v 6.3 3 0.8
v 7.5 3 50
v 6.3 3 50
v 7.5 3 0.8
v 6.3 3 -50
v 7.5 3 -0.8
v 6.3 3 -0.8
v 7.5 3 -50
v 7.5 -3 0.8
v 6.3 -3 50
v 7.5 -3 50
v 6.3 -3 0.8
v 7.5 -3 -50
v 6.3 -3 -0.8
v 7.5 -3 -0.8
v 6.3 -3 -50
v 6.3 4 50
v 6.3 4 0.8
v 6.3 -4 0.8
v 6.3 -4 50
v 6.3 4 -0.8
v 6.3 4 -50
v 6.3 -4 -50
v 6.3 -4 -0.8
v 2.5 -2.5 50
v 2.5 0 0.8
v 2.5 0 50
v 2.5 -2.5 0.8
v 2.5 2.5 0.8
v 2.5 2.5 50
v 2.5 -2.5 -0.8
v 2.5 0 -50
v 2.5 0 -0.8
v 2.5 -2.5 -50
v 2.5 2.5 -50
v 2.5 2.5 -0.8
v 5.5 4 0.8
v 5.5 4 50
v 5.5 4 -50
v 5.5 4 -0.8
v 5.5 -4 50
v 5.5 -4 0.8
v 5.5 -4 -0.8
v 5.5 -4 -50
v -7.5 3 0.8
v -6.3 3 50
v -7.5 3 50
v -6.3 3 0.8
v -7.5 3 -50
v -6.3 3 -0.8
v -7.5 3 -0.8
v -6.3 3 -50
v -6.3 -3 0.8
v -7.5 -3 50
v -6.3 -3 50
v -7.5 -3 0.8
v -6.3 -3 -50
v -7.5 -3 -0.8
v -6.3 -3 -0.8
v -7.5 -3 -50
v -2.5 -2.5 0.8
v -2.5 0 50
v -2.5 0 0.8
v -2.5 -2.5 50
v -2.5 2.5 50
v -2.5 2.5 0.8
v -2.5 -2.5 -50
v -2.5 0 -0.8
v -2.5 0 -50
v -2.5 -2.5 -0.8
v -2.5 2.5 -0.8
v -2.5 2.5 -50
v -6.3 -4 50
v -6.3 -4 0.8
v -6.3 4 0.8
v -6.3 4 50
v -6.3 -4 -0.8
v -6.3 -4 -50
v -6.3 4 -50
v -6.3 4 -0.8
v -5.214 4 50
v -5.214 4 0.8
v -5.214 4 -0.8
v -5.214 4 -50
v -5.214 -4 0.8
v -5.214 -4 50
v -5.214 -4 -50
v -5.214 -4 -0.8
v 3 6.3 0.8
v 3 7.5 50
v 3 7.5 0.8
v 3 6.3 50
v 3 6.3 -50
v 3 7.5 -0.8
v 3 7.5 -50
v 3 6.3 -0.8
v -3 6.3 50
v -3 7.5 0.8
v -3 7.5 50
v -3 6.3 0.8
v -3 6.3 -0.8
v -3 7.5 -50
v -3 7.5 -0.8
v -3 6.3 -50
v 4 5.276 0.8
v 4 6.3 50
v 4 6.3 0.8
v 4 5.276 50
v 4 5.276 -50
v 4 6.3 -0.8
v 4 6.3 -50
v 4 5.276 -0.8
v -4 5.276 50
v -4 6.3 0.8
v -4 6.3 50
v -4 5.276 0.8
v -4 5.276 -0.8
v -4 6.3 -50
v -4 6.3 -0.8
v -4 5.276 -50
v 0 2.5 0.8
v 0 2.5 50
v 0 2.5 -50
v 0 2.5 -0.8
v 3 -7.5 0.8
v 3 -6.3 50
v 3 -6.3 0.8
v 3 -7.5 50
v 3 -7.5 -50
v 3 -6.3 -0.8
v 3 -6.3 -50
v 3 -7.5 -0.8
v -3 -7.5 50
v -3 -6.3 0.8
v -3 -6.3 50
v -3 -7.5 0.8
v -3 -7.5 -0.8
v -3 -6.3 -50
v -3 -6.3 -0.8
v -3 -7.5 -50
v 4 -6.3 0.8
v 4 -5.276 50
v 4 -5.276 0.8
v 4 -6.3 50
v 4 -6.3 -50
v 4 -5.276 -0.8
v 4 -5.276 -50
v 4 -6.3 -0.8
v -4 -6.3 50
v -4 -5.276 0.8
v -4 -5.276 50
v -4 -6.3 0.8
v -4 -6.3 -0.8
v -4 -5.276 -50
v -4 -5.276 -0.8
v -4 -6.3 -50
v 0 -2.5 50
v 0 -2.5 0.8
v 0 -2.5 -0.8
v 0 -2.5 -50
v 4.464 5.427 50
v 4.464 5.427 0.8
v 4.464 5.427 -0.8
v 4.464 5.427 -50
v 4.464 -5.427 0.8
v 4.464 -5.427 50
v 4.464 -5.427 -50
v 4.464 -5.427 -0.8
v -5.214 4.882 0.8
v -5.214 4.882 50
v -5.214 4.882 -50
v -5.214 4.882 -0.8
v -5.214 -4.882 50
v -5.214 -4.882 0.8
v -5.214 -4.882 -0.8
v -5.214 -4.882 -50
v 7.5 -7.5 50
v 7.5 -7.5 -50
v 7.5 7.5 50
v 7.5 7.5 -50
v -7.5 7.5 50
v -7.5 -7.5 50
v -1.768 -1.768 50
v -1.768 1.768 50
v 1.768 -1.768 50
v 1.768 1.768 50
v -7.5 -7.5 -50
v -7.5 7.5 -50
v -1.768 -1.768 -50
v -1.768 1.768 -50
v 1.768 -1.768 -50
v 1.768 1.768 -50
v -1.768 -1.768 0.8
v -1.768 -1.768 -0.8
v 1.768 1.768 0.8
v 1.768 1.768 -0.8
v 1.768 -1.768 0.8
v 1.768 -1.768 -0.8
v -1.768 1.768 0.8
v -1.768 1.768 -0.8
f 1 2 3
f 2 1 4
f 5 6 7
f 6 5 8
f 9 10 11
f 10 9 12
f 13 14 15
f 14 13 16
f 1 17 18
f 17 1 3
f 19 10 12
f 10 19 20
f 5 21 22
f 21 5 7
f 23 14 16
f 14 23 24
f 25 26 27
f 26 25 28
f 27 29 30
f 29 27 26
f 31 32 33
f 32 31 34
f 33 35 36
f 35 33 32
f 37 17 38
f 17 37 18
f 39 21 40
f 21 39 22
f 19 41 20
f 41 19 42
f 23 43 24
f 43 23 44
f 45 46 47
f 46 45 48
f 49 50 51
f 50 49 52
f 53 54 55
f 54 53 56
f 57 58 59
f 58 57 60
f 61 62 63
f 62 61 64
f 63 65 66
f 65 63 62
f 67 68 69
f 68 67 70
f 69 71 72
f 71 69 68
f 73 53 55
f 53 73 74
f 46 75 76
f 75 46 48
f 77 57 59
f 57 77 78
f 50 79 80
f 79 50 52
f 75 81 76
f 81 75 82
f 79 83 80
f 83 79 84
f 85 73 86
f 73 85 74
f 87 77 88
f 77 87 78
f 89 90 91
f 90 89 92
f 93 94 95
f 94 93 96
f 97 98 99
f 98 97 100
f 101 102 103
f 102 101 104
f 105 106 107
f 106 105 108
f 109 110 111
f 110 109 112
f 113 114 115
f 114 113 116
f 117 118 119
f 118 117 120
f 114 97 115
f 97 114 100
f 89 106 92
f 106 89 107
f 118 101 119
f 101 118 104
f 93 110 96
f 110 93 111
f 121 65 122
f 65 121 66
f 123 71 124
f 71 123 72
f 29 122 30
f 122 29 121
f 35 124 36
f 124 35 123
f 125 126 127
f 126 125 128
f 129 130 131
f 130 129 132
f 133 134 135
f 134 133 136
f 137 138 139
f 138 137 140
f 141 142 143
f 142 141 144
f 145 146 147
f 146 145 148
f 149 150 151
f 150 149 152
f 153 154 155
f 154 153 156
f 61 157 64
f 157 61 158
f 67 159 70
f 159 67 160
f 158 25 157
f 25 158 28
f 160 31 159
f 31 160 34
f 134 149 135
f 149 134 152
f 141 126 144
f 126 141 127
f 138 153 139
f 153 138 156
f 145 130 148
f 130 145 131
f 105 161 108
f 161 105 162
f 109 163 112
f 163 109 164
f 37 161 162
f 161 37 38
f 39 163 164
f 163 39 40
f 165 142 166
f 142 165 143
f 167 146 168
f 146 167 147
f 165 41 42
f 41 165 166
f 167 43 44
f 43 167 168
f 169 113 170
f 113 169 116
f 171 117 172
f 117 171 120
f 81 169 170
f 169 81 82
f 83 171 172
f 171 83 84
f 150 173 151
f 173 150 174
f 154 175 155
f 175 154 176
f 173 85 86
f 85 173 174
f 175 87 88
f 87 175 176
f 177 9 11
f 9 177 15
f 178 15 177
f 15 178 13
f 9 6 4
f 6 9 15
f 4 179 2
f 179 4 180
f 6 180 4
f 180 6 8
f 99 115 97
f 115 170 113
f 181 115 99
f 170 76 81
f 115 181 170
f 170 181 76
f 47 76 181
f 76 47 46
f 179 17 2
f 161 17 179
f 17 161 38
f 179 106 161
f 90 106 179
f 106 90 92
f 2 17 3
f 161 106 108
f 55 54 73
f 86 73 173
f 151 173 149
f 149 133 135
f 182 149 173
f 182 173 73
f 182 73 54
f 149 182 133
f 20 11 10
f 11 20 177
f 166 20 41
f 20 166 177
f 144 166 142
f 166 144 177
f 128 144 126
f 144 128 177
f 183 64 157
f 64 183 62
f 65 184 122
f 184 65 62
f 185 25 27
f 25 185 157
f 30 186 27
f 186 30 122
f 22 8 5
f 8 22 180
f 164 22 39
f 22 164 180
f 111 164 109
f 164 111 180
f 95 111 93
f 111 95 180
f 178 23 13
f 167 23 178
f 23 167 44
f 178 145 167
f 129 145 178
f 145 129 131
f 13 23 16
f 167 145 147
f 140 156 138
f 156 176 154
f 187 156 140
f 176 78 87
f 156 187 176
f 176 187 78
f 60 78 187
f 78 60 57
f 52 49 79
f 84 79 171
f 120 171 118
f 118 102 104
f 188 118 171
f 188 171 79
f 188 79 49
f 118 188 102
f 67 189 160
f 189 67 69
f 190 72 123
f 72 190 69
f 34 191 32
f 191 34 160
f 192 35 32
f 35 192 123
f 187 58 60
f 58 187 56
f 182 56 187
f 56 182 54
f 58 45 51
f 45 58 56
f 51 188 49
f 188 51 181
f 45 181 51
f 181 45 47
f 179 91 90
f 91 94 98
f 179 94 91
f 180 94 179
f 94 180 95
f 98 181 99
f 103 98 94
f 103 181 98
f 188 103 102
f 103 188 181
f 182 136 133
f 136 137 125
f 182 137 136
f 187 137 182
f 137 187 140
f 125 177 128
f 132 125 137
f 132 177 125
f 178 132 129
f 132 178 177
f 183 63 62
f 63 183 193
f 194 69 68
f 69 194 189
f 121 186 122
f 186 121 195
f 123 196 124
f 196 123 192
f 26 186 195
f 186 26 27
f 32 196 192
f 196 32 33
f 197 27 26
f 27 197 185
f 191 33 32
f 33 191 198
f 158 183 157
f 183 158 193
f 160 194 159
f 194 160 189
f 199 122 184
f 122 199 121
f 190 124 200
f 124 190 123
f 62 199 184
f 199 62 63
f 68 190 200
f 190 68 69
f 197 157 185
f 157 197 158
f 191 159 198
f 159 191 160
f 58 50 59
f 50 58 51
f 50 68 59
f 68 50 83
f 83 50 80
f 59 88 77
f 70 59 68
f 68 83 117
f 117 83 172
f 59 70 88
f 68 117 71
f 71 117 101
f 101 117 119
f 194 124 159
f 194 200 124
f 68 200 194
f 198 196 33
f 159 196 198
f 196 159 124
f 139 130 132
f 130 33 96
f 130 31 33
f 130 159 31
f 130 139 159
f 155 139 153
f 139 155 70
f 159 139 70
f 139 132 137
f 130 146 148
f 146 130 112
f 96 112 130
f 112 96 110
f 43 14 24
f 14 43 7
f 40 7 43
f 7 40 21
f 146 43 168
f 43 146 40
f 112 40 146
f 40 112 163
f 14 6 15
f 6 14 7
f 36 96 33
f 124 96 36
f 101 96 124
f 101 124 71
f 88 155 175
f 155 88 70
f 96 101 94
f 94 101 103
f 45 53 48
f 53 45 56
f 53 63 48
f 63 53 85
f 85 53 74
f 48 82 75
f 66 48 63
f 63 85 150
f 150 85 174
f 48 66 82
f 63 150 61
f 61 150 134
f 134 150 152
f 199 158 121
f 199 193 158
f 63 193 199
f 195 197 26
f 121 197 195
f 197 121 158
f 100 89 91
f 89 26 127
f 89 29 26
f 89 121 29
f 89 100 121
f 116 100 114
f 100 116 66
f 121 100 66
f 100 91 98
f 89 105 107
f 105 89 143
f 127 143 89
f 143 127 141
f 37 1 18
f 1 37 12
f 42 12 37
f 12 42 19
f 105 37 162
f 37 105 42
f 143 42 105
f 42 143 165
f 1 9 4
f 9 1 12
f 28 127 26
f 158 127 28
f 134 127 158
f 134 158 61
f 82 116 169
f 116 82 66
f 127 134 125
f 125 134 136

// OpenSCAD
// Parameters
cross_section_width = 15; //[7.5:30:0.5]
cross_section_height = 15; //[7.5:30:0.5]
length = 100; //[50:200:1]
center = 1; //[0:1:1]
cornerHole = 1; //[0:1:1]
wall_thickness = 1.6; //[0.8:3.2:0.1]
slot_opening_width = 6.0; //[3.0:10.0:0.1]
slot_inner_width = 8.0; //[4.0:12.0:0.1]
slot_depth = 4.2; //[2.0:7.0:0.1]
slot_neck_depth = 2.0; //[1.0:4.0:0.1]
center_bore_diameter = 5.0; //[2.0:8.0:0.1]
corner_hole_diameter = 3.0; //[1.5:6.0:0.1]
corner_hole_inset = 3.5; //[2.0:6.0:0.1]
overlap = 0.8; //[0.5:2.0:0.1]

// Extrusion - complete geometry
module extrusion() {
  color("Silver") {
    difference() {
      // Main body
      cube([cross_section_width, cross_section_height, length], center=true);
      
      // Center bore
      translate([0, 0, 0])
        cylinder(r=center_bore_diameter/2, h=length + 2*overlap, center=true);
      
      // T-slot channels
      union() {
        // X-axis slots
        translate([cross_section_width/2 - (slot_neck_depth + 2*overlap)/2 + overlap, 0, 0])
          cube([slot_neck_depth + 2*overlap, slot_opening_width, length + 2*overlap], center=true);
        translate([cross_section_width/2 - slot_neck_depth - (slot_depth - slot_neck_depth + 2*overlap)/2 + overlap, 0, 0])
          cube([slot_depth - slot_neck_depth + 2*overlap, slot_inner_width, length + 2*overlap], center=true);
        translate([-cross_section_width/2 + (slot_neck_depth + 2*overlap)/2 - overlap, 0, 0])
          cube([slot_neck_depth + 2*overlap, slot_opening_width, length + 2*overlap], center=true);
        translate([-cross_section_width/2 + slot_neck_depth + (slot_depth - slot_neck_depth + 2*overlap)/2 - overlap, 0, 0])
          cube([slot_depth - slot_neck_depth + 2*overlap, slot_inner_width, length + 2*overlap], center=true);
        
        // Y-axis slots
        translate([0, cross_section_height/2 - (slot_neck_depth + 2*overlap)/2 + overlap, 0])
          cube([slot_opening_width, slot_neck_depth + 2*overlap, length + 2*overlap], center=true);
        translate([0, cross_section_height/2 - slot_neck_depth - (slot_depth - slot_neck_depth + 2*overlap)/2 + overlap, 0])
          cube([slot_inner_width, slot_depth - slot_neck_depth + 2*overlap, length + 2*overlap], center=true);
        translate([0, -cross_section_height/2 + (slot_neck_depth + 2*overlap)/2 - overlap, 0])
          cube([slot_opening_width, slot_neck_depth + 2*overlap, length + 2*overlap], center=true);
        translate([0, -cross_section_height/2 + slot_neck_depth + (slot_depth - slot_neck_depth + 2*overlap)/2 - overlap, 0])
          cube([slot_inner_width, slot_depth - slot_neck_depth + 2*overlap, length + 2*overlap], center=true);
      }
      
      // Corner holes
      if (cornerHole) {
        union() {
          translate([cross_section_width/2 - corner_hole_inset, cross_section_height/2 - corner_hole_inset, 0])
            cylinder(r=corner_hole_diameter/2, h=length + 2*overlap, center=true);
          translate([cross_section_width/2 - corner_hole_inset, -cross_section_height/2 + corner_hole_inset, 0])
            cylinder(r=corner_hole_diameter/2, h=length + 2*overlap, center=true);
          translate([-cross_section_width/2 + corner_hole_inset, cross_section_height/2 - corner_hole_inset, 0])
            cylinder(r=corner_hole_diameter/2, h=length + 2*overlap, center=true);
          translate([-cross_section_width/2 + corner_hole_inset, -cross_section_height/2 + corner_hole_inset, 0])
            cylinder(r=corner_hole_diameter/2, h=length + 2*overlap, center=true);
        }
      }
    }
  }
}

// Extrusion Cross Section - complete geometry
module extrusion_cross_section() {
  color("Silver") {
    linear_extrude(height=wall_thickness, center=true) {
      square([cross_section_width, cross_section_height], center=true);
    }
  }
}

// Box Corner Profile Section - complete geometry
module box_corner_profile_section() {
  color("Silver") {
    translate([cross_section_width/4, cross_section_height/4, 0])
      cube([cross_section_width/2, cross_section_height/2, wall_thickness], center=true);
  }
}

// Box Corner Profile Sections - complete geometry
module box_corner_profile_sections() {
  color("Silver") {
    translate([-cross_section_width/4, -cross_section_height/4, 0])
      cube([cross_section_width/2, cross_section_height/2, wall_thickness], center=true);
  }
}

// Assembly
module assembly() {
  extrusion();
  extrusion_cross_section();
  box_corner_profile_section();
  box_corner_profile_sections();
}

assembly();
